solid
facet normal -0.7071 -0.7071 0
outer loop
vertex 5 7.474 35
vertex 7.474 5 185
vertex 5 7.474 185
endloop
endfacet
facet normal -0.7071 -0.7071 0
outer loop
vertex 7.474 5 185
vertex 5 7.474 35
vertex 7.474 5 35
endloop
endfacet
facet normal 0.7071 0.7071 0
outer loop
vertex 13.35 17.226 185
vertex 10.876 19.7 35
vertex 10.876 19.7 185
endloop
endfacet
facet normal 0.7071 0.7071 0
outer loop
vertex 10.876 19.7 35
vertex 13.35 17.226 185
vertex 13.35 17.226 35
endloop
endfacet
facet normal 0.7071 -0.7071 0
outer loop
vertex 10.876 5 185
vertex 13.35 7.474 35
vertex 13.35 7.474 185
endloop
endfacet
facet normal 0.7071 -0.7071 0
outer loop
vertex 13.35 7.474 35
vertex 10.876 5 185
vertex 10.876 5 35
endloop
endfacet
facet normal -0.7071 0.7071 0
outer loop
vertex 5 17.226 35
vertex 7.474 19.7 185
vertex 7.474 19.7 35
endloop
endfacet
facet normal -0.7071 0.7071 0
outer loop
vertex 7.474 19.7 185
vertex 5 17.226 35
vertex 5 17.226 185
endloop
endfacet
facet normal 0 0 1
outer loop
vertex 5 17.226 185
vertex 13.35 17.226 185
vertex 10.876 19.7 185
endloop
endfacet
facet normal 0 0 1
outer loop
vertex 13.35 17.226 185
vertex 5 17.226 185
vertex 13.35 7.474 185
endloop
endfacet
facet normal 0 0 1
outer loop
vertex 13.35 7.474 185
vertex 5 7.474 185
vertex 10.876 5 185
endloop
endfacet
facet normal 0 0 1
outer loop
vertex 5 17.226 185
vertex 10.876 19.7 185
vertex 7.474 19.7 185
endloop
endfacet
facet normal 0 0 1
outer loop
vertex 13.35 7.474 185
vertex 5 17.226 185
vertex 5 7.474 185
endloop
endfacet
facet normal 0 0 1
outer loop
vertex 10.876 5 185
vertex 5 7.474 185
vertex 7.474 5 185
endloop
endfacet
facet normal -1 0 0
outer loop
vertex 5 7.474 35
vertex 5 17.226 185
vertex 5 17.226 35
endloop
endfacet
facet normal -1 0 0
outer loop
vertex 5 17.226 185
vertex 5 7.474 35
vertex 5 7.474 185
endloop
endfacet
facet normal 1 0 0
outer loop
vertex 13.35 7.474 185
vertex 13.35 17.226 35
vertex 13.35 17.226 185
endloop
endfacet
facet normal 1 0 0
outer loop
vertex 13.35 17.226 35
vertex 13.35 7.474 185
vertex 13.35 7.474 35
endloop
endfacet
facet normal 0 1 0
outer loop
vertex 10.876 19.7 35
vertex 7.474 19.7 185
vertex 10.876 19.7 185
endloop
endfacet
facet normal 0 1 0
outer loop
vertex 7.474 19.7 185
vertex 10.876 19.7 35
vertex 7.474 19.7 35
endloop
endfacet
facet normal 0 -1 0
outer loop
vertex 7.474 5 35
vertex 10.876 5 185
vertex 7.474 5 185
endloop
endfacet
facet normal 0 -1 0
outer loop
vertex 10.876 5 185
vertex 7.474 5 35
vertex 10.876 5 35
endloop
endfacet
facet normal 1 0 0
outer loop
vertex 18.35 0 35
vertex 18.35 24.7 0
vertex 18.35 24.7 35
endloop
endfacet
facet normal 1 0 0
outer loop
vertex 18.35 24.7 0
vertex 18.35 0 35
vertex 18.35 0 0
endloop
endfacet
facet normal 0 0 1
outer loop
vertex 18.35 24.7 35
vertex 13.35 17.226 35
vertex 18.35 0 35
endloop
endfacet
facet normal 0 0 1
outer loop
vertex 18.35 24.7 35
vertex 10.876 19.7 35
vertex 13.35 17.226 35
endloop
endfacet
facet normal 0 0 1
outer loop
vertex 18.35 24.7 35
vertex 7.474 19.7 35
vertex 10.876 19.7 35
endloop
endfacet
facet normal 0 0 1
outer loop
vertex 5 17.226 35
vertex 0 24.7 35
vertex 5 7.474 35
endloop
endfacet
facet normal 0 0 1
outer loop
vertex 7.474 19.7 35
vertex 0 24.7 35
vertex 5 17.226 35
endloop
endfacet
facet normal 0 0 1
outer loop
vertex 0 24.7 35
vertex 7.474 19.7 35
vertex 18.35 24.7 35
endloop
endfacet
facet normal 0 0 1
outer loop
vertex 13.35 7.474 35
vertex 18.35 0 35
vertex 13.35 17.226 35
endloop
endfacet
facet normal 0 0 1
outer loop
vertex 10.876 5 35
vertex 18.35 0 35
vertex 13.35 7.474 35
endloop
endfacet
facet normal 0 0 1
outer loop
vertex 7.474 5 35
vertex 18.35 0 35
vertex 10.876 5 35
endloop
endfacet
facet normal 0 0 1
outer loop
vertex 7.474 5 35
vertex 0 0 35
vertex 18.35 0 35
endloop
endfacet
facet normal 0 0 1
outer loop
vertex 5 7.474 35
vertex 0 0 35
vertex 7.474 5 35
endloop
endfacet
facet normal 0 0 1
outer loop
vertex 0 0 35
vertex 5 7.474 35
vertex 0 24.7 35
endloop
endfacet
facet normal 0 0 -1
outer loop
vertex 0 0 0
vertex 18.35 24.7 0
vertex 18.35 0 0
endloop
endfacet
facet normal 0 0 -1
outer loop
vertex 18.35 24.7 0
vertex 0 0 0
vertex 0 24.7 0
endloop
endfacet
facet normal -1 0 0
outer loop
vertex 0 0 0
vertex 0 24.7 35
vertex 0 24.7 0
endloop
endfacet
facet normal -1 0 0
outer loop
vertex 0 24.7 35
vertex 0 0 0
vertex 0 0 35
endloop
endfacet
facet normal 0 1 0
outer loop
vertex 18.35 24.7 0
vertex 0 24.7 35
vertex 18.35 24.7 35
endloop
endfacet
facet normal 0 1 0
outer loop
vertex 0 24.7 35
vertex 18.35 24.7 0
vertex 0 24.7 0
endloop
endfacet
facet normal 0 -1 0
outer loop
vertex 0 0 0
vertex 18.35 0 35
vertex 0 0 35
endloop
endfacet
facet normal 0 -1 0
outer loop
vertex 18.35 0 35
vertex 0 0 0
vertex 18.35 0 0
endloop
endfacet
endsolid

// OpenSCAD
/********************************************/
/*     Shop Pencil Sharpening Lathe Bit     */
/*                                          */
/*        Created by Jason Hardman          */
/*               2023-10-21                 */
/*                                          */
/********************************************/


/*  Definitions  */
$fn = 500;

BUFFER_SPACE = 0.8;

// Pencil Dimentions of Pencil Laying Flat (millimeters)
PENCIL_X = 175;            // Pencil Length
PENCIL_Y = 13.9 + BUFFER_SPACE;           // Pencil Width (thickest)
PENCIL_Z = 7.55 + BUFFER_SPACE;           // Pencil Width (thinnest)
CHAMFER_CUTOUT = 12 + BUFFER_SPACE;     // distance between Chamfer planes

// Lathe Bit Dimentions
LB_X = PENCIL_Z + 10;
LB_Y = PENCIL_Y + 10;
LB_Z = 35;


/*  Modules  */
module pencil(t_x=0, t_y=0, t_z=0,
              r_x=0, r_y=0, r_z=0) {
    // Defines the pencil. Takes postion args for translation

    // Some maths
    chamf_diag = sqrt( 2 * (CHAMFER_CUTOUT)^2 );
    diag_translation = chamf_diag/2;
    diag_trans_y = PENCIL_Y/2;
    diag_trans_z = diag_translation - PENCIL_Z/2;

    translate([t_x, t_y, t_z]){
        rotate([r_x, r_y, r_z]){
            intersection() {
                translate([-0.5,diag_trans_y,-diag_trans_z]) {
                        rotate([45,0,0]) {
                        color("orangered", 1.0) {cube([PENCIL_X+1, CHAMFER_CUTOUT, CHAMFER_CUTOUT]);}
                    }
                }
                color("orangered", 1.0) {cube([PENCIL_X, PENCIL_Y, PENCIL_Z]);}
            }
        }
    }
}


module lathe_bit(t_x=0, t_y=0, t_z=0) {
    // Drill meets pencil to lathe in pencil sharpener

    translate([t_x, t_y, t_z]) {
        color("white", 1.0) {cube([LB_X, LB_Y, LB_Z]);}
    }
}


/*  Function Calls  */
pencil(r_y=-90,
       t_x=(PENCIL_Z/2)+(LB_X/2),
       t_y=(LB_Y/2)-(PENCIL_Y/2),
       t_z=10
);
lathe_bit();
